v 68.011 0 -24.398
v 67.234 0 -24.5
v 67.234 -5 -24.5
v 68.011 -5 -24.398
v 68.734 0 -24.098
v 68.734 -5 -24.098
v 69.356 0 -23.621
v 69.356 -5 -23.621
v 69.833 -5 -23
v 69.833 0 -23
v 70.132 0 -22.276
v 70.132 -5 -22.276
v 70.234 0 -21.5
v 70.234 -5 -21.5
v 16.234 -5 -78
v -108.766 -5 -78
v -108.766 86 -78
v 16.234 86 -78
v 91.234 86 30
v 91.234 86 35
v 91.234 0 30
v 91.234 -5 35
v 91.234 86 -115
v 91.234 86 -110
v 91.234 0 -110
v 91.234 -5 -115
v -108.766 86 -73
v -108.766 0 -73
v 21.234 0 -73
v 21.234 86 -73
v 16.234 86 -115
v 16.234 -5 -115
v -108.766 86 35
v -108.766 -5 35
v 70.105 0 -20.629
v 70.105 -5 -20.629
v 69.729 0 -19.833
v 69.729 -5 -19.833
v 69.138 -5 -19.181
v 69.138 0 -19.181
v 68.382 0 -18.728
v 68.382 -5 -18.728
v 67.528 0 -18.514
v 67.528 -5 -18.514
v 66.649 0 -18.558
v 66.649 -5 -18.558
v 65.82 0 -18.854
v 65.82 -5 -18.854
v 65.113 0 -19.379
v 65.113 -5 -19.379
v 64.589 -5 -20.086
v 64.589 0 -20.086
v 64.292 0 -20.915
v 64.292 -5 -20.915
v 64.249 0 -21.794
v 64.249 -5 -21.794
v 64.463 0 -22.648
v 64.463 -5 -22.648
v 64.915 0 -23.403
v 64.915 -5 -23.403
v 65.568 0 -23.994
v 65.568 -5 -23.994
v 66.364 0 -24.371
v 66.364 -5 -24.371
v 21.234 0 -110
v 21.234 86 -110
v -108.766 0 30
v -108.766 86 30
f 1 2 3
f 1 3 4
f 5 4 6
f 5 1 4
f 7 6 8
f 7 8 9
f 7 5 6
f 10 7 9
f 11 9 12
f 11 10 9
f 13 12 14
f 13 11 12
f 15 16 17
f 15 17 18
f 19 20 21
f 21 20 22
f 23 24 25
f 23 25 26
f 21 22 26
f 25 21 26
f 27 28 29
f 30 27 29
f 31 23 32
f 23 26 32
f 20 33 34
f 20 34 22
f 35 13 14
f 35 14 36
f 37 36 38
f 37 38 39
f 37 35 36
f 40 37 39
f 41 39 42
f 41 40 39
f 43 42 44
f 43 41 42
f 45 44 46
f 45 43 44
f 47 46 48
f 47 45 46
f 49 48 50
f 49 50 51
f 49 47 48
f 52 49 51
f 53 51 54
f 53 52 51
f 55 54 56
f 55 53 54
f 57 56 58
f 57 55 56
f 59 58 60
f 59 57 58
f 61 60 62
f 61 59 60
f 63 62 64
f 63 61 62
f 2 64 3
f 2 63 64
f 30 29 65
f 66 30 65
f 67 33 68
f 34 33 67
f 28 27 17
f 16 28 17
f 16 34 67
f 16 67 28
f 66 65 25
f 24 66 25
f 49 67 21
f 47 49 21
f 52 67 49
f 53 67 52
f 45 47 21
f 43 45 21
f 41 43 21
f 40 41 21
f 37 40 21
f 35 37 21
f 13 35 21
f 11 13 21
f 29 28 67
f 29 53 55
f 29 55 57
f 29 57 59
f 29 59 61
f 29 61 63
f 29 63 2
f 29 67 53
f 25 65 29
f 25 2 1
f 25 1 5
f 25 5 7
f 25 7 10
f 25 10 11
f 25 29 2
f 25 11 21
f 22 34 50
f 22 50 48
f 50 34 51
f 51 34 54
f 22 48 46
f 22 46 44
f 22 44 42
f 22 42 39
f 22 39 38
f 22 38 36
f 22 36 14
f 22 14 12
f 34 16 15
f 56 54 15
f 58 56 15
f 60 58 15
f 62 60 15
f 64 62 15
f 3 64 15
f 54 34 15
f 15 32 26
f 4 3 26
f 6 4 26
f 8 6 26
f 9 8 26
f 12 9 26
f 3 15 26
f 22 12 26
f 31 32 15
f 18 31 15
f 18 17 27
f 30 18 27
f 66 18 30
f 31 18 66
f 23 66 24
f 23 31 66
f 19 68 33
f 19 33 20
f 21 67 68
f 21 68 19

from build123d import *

# Parameters (mm, degrees)
SZKIC1_R                    = 3
DODANIE_WYCI_GNI_CIE1_DEPTH = 5
SZKIC1_4_W                  = 200
SZKIC1_4_H                  = 5
DODANIE_WYCI_GNI_CIE2_DEPTH = 86


with BuildPart() as part:
    # Szkic1 → Dodanie-wyciągnięcie1 (new body)
    with BuildSketch(Plane(origin=(0, 0, 0), x_dir=(1, 0, 0), z_dir=(0, 1, 0))):
        Polygon((91.234446081, 115), (16.234446081, 115), (16.234446081, 78), (-108.765553919, 78), (-108.765553919, -35), (91.234446081, -35), align=None)
        with Locations((67.234446081, 21.5)):
            Circle(SZKIC1_R, mode=Mode.SUBTRACT)
    extrude(amount=-DODANIE_WYCI_GNI_CIE1_DEPTH)

    # Szkic1<4> → Dodanie-wyciągnięcie2 (add)
    with BuildSketch(Plane(origin=(0, 0, 0), x_dir=(1, 0, 0), z_dir=(0, 1, 0))):
        with Locations((-8.765553919, -32.5)):
            Rectangle(SZKIC1_4_W, SZKIC1_4_H)
        Polygon((91.234446081, 110), (91.234446081, 115), (16.234446081, 115), (16.234446081, 78), (-108.765553919, 78), (-108.765553919, 73), (21.234446081, 73), (21.234446081, 110), align=None)
    extrude(amount=DODANIE_WYCI_GNI_CIE2_DEPTH)


solid = part.part
